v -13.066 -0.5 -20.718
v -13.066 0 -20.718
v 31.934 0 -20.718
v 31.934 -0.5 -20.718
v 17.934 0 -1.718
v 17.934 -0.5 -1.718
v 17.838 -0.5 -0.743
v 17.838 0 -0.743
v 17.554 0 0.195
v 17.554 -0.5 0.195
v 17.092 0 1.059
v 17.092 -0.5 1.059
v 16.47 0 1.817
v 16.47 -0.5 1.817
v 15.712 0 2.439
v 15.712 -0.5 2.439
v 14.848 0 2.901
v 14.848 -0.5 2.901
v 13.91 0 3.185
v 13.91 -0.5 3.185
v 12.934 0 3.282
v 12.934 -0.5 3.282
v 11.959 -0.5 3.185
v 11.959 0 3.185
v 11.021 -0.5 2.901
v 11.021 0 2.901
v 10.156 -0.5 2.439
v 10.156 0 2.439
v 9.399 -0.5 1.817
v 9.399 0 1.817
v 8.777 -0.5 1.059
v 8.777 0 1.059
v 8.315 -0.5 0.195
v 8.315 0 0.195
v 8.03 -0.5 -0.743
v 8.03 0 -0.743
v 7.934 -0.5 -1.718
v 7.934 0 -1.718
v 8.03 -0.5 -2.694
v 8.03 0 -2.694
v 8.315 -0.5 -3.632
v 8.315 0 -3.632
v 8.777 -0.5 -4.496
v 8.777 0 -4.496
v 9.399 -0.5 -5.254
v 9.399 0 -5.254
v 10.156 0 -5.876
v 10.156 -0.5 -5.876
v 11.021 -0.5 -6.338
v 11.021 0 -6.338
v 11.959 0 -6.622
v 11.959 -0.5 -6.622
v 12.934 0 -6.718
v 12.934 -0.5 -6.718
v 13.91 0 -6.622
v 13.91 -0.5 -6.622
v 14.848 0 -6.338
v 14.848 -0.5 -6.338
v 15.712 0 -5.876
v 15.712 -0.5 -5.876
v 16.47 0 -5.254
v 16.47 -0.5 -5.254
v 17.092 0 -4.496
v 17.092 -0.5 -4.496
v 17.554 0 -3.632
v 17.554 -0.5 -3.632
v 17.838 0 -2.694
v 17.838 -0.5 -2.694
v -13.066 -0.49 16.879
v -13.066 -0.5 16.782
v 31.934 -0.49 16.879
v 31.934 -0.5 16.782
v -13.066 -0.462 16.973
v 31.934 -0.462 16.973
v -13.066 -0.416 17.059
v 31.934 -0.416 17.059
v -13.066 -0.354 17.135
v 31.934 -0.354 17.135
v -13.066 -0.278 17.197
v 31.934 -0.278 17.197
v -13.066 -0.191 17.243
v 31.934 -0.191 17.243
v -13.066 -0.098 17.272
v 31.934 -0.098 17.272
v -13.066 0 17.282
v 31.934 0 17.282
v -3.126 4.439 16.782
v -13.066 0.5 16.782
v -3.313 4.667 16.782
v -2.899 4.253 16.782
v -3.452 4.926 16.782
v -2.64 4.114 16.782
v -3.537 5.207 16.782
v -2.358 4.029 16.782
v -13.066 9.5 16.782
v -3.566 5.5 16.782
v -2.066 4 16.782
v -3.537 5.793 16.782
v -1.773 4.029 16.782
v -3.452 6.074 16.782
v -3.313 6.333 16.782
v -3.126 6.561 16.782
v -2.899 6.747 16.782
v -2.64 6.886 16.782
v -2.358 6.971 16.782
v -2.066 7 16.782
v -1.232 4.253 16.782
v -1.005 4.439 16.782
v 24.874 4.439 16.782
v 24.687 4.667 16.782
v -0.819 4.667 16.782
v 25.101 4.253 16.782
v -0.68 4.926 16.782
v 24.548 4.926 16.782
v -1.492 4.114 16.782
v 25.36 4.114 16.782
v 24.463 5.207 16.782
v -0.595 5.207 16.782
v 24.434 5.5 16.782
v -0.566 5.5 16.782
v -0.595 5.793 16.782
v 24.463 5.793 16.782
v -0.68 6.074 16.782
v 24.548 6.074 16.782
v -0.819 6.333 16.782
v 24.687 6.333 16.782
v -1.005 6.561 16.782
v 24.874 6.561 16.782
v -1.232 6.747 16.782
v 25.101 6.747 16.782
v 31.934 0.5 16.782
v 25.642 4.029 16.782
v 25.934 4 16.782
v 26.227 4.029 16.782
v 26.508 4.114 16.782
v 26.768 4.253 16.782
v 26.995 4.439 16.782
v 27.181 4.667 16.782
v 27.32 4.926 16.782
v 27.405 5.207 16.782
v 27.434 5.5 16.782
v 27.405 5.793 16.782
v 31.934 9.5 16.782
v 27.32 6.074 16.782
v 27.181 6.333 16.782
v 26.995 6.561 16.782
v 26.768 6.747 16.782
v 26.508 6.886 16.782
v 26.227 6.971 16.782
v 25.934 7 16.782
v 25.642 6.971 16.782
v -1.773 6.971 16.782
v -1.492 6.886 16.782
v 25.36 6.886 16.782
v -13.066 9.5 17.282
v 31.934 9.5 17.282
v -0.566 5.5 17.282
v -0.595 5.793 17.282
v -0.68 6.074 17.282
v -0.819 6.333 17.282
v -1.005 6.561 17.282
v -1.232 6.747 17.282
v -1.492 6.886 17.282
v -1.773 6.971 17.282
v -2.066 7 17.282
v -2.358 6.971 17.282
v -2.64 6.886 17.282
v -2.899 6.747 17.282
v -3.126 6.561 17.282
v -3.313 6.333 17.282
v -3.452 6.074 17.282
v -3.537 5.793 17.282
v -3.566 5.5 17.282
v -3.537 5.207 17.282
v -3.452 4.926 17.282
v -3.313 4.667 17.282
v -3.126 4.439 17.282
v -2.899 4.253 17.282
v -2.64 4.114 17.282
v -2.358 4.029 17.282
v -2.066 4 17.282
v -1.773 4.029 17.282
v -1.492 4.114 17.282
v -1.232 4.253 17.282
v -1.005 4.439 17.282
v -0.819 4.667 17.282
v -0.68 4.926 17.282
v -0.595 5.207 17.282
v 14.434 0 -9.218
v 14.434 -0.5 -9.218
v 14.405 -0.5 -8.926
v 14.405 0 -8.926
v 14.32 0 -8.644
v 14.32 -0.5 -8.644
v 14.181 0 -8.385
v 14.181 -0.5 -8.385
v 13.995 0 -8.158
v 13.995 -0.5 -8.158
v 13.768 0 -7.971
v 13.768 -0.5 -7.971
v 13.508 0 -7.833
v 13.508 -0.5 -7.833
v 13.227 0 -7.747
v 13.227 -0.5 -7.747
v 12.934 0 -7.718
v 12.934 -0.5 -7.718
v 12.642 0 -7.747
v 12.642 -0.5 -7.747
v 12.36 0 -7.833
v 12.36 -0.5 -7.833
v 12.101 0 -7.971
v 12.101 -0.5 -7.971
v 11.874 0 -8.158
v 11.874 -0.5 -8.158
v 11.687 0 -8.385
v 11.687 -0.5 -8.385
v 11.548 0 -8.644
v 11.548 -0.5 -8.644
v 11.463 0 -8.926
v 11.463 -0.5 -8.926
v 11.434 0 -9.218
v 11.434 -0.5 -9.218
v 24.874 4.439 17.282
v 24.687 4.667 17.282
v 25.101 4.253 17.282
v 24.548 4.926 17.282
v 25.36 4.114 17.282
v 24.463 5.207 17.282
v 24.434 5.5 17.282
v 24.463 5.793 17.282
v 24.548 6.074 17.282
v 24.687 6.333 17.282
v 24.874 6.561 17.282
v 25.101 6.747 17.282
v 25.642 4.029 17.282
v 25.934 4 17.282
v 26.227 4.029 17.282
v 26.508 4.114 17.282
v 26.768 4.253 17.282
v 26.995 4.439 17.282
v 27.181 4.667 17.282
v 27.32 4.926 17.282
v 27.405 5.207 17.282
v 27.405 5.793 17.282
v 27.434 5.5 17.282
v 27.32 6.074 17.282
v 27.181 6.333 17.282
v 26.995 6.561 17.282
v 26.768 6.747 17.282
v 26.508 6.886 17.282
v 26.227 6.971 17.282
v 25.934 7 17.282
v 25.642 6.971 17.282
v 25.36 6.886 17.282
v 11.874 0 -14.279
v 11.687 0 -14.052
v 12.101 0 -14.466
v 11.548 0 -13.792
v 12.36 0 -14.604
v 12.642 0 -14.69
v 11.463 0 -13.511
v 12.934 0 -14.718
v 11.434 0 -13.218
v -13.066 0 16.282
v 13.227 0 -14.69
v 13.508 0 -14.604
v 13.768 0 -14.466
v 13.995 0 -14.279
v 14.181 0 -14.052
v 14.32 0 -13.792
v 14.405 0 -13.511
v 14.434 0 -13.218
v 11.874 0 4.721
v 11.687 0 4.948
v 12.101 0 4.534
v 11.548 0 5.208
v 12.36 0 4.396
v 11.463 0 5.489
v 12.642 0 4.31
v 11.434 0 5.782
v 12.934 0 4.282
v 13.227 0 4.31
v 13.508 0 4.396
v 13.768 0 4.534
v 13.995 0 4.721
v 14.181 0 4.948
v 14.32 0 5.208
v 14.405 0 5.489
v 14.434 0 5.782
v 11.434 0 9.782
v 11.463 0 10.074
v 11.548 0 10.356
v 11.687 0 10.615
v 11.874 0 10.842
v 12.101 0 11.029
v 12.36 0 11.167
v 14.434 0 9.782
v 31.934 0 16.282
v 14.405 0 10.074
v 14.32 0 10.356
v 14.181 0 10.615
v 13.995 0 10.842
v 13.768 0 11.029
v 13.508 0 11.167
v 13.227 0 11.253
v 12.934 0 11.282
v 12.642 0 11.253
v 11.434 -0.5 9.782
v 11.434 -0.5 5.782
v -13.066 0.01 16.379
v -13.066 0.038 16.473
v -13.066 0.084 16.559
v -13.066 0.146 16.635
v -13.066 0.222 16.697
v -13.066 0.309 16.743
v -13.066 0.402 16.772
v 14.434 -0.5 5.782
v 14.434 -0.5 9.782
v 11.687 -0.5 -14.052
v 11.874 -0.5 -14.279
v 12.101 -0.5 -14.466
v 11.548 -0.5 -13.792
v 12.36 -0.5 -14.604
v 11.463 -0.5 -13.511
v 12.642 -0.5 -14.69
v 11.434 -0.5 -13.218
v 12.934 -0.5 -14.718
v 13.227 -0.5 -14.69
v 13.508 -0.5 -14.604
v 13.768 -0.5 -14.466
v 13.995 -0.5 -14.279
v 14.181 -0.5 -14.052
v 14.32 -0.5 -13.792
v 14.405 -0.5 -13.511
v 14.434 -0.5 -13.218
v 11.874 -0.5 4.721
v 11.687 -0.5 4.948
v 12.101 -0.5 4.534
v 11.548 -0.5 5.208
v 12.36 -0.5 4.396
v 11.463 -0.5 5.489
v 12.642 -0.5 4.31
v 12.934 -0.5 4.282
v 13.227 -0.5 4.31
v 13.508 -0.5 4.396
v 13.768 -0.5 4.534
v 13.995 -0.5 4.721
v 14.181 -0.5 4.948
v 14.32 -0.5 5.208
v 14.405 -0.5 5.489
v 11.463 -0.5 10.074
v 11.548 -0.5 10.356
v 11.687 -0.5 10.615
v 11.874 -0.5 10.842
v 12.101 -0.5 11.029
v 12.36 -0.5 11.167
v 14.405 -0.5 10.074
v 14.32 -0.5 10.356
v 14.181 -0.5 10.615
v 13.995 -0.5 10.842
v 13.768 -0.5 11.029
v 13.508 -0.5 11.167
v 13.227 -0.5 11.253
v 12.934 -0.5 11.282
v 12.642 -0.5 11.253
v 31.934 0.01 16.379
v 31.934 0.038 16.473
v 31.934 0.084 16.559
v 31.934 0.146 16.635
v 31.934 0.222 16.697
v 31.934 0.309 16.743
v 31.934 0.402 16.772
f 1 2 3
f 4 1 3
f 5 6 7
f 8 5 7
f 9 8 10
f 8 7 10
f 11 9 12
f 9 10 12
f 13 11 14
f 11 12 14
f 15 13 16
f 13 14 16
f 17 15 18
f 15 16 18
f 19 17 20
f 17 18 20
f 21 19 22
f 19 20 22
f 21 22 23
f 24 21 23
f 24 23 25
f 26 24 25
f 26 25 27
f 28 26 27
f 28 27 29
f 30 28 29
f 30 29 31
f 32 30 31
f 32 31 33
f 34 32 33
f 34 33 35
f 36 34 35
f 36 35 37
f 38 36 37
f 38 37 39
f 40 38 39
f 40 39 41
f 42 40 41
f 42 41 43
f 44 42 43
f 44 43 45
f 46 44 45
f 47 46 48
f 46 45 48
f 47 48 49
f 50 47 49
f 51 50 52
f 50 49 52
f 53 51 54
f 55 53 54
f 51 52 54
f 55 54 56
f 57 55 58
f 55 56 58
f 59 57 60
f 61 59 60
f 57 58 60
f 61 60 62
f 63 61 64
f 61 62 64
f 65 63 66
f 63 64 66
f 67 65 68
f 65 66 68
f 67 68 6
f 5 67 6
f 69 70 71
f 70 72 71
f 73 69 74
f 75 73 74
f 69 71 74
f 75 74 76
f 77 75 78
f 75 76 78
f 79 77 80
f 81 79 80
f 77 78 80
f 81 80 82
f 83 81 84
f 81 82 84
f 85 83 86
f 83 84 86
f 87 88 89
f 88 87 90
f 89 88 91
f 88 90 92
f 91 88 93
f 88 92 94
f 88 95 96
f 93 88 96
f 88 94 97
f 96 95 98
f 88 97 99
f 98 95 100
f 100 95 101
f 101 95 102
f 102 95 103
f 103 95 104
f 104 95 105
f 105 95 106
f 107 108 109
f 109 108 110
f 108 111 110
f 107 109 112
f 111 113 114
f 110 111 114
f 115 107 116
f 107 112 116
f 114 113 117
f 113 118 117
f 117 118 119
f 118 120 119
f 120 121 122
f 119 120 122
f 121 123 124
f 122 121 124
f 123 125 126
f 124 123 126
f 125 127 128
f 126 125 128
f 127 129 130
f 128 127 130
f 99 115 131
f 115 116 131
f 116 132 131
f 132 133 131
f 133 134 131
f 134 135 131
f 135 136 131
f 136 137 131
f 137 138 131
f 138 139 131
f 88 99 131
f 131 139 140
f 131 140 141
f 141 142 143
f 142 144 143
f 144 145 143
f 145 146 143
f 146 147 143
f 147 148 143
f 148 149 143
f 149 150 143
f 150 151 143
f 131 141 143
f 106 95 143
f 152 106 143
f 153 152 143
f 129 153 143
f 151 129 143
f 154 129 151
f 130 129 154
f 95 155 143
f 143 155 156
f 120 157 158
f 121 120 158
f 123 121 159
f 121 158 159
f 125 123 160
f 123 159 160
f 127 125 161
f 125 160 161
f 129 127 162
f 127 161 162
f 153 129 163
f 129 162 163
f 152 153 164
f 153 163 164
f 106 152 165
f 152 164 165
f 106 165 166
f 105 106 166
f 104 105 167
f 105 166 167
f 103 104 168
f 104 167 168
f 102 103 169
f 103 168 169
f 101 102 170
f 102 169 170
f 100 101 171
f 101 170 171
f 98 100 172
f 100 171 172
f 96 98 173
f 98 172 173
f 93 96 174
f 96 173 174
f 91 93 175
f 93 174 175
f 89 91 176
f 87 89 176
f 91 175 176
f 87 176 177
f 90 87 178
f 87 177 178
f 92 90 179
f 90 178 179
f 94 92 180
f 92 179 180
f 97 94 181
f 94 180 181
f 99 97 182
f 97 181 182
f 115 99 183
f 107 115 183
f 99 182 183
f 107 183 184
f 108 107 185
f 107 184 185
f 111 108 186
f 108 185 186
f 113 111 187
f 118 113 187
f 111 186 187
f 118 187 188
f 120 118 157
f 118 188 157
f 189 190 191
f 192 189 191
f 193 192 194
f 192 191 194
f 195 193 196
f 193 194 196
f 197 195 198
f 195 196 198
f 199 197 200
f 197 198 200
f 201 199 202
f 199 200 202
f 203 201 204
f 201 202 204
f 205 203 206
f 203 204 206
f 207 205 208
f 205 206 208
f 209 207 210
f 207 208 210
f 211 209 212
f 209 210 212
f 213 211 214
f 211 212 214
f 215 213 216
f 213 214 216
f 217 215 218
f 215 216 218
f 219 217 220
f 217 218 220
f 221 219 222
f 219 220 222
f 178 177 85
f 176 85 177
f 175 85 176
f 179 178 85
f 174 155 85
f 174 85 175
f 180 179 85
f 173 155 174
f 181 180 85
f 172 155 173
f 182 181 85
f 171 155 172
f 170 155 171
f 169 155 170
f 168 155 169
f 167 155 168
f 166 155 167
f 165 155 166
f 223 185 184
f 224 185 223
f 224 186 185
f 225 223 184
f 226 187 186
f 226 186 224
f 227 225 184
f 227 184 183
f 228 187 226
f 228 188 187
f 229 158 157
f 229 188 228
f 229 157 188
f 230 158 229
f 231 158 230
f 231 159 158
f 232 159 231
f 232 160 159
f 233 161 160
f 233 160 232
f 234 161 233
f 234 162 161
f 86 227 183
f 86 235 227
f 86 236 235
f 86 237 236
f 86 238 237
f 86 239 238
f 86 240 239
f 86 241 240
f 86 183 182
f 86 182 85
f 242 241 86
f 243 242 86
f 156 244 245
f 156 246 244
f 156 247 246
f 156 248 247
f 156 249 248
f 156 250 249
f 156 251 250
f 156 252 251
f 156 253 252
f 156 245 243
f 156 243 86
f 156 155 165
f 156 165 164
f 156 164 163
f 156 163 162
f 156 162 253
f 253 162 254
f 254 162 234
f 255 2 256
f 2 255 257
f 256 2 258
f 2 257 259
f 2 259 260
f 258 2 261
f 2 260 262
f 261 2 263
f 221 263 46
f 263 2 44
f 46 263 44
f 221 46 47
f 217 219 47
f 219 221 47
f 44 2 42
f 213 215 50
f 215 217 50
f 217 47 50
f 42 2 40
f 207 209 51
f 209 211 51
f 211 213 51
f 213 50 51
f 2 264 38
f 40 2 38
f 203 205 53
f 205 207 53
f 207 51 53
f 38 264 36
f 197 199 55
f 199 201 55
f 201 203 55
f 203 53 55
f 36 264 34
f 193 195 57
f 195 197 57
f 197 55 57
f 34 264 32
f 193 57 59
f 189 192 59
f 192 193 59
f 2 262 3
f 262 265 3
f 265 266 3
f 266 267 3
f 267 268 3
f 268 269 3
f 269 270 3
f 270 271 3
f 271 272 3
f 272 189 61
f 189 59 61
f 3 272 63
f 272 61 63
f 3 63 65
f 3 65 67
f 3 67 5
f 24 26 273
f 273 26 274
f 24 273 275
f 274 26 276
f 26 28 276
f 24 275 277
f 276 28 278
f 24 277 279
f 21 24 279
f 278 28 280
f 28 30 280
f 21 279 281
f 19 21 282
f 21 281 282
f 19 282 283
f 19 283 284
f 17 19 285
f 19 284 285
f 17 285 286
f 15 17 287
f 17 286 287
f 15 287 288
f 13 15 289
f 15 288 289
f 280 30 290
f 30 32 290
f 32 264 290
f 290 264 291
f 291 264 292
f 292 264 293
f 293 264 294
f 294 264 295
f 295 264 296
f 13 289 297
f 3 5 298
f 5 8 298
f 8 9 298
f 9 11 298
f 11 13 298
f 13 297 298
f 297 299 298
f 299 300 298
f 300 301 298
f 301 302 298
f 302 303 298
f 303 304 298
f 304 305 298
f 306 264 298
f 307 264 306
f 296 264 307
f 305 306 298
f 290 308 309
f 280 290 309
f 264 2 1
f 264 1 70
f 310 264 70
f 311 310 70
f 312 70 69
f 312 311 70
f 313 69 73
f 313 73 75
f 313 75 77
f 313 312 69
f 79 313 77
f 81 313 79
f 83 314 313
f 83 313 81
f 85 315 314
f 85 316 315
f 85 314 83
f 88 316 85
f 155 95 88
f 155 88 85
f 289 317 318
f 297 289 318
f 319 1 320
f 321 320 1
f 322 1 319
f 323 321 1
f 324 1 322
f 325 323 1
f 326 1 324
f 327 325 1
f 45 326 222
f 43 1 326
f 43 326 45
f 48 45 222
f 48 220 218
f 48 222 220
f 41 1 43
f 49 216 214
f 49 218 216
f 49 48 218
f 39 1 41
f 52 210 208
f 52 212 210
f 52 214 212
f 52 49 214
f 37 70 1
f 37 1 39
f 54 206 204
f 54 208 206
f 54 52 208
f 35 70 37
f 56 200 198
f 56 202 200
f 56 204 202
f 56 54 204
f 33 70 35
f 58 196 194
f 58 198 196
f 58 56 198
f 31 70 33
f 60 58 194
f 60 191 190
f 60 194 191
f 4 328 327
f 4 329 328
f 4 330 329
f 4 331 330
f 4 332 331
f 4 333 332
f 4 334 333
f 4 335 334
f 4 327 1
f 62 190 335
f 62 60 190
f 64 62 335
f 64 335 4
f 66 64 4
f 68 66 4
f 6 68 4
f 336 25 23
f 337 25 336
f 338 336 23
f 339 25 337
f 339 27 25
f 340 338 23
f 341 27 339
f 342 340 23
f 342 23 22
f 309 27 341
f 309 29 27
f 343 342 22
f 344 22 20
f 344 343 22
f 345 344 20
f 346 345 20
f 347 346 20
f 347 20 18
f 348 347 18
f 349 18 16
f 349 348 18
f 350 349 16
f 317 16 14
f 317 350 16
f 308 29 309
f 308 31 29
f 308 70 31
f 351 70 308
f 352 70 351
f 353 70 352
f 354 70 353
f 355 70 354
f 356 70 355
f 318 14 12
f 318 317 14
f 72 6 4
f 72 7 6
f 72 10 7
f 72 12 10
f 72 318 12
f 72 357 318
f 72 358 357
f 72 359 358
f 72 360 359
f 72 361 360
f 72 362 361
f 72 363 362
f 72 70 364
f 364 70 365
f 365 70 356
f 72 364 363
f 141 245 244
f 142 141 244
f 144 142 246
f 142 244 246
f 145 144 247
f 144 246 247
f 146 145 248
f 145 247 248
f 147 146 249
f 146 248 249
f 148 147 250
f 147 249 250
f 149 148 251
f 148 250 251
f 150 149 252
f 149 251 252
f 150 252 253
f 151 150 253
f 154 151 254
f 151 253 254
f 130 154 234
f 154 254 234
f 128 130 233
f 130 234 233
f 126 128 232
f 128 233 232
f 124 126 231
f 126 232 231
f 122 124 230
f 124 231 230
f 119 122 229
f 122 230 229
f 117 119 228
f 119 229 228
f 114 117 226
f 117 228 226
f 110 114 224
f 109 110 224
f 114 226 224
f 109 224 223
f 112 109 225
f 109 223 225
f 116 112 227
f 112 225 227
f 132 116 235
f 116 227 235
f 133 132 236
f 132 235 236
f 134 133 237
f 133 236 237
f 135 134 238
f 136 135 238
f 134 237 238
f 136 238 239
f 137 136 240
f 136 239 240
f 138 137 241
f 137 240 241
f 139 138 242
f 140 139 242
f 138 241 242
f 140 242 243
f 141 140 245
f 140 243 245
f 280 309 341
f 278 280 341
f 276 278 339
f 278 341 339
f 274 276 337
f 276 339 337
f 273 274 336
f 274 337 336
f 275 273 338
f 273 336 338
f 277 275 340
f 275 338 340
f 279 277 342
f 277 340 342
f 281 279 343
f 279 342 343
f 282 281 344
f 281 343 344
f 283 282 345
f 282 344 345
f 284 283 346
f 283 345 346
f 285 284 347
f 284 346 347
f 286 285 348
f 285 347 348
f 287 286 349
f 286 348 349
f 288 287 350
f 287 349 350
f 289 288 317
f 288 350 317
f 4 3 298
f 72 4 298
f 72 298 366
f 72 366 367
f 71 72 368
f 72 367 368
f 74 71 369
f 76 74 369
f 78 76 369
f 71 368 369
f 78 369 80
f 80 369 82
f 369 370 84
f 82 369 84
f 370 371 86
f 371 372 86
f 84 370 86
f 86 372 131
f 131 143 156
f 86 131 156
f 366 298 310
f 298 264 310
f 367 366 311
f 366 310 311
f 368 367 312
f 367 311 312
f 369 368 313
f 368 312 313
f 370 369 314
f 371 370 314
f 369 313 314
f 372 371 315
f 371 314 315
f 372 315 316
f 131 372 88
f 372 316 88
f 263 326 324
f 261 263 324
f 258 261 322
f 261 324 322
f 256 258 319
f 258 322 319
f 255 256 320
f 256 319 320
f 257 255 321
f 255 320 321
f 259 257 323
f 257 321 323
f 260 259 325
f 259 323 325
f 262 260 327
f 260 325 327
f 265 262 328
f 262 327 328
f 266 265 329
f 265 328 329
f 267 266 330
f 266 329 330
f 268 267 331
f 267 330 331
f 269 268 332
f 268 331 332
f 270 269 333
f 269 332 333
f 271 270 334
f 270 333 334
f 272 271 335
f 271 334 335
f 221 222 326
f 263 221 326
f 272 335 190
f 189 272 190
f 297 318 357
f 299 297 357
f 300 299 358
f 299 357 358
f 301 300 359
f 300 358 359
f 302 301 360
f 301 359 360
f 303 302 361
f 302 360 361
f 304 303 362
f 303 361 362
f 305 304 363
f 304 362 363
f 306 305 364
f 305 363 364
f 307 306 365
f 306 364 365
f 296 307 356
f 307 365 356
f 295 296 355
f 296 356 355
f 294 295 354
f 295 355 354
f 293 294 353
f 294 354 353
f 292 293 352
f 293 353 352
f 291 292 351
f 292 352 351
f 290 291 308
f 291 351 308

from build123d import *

# Parameters (mm, degrees)
F0_W     = 45
F0_H     = 38
F1_DEPTH = 0.5
F2_W     = 45
F2_H     = 10
F2_R     = 1.5
F3_DEPTH = 0.5
F4_R     = 0.5
F5_R     = 5
F6_DEPTH = 25


with BuildPart() as f1:
    # F0 (on Front) → F1 (new body)
    with BuildSketch(Plane.XZ):
        with Locations((9.434236, -1.718442)):
            Rectangle(F0_W, F0_H)
    extrude(amount=F1_DEPTH)

    # F2 (on face) → F3 (join)
    with BuildSketch(Plane.XY.offset(17.281558)):
        with Locations((9.434236, 4.5)):
            Rectangle(F2_W, F2_H)
        with Locations((-2.065764, 5.5)):
            Circle(F2_R, mode=Mode.SUBTRACT)
        with Locations((25.934236, 5.5)):
            Circle(F2_R, mode=Mode.SUBTRACT)
    extrude(amount=-F3_DEPTH)

    # F4
    f4_edges = [f1.edges().sort_by_distance(p)[0] for p in [
        (9.434236, -0.5, 17.281558),
        (9.434236, 0, 16.781558),
    ]]
    fillet(f4_edges, radius=F4_R)

    # F5 (on face) → F6 (cut)
    with BuildSketch(Plane.XZ.offset(0.5)):
        with Locations((12.934236, -1.718442)):
            Circle(F5_R)
        with BuildLine():
            Line((14.434236, 5.781558), (14.434236, 9.781558))
            ThreePointArc((14.434236, 9.781558), (12.934236, 11.281558), (11.434236, 9.781558))
            Line((11.434236, 9.781558), (11.434236, 5.781558))
            ThreePointArc((11.434236, 5.781558), (12.934236, 4.281558), (14.434236, 5.781558))
        make_face()
        with BuildLine():
            Line((14.434236, -13.218442), (14.434236, -9.218442))
            ThreePointArc((14.434236, -9.218442), (12.934236, -7.718442), (11.434236, -9.218442))
            Line((11.434236, -9.218442), (11.434236, -13.218442))
            ThreePointArc((11.434236, -13.218442), (12.934236, -14.718442), (14.434236, -13.218442))
        make_face()
    extrude(amount=-F6_DEPTH, mode=Mode.SUBTRACT)


solid = f1.part
